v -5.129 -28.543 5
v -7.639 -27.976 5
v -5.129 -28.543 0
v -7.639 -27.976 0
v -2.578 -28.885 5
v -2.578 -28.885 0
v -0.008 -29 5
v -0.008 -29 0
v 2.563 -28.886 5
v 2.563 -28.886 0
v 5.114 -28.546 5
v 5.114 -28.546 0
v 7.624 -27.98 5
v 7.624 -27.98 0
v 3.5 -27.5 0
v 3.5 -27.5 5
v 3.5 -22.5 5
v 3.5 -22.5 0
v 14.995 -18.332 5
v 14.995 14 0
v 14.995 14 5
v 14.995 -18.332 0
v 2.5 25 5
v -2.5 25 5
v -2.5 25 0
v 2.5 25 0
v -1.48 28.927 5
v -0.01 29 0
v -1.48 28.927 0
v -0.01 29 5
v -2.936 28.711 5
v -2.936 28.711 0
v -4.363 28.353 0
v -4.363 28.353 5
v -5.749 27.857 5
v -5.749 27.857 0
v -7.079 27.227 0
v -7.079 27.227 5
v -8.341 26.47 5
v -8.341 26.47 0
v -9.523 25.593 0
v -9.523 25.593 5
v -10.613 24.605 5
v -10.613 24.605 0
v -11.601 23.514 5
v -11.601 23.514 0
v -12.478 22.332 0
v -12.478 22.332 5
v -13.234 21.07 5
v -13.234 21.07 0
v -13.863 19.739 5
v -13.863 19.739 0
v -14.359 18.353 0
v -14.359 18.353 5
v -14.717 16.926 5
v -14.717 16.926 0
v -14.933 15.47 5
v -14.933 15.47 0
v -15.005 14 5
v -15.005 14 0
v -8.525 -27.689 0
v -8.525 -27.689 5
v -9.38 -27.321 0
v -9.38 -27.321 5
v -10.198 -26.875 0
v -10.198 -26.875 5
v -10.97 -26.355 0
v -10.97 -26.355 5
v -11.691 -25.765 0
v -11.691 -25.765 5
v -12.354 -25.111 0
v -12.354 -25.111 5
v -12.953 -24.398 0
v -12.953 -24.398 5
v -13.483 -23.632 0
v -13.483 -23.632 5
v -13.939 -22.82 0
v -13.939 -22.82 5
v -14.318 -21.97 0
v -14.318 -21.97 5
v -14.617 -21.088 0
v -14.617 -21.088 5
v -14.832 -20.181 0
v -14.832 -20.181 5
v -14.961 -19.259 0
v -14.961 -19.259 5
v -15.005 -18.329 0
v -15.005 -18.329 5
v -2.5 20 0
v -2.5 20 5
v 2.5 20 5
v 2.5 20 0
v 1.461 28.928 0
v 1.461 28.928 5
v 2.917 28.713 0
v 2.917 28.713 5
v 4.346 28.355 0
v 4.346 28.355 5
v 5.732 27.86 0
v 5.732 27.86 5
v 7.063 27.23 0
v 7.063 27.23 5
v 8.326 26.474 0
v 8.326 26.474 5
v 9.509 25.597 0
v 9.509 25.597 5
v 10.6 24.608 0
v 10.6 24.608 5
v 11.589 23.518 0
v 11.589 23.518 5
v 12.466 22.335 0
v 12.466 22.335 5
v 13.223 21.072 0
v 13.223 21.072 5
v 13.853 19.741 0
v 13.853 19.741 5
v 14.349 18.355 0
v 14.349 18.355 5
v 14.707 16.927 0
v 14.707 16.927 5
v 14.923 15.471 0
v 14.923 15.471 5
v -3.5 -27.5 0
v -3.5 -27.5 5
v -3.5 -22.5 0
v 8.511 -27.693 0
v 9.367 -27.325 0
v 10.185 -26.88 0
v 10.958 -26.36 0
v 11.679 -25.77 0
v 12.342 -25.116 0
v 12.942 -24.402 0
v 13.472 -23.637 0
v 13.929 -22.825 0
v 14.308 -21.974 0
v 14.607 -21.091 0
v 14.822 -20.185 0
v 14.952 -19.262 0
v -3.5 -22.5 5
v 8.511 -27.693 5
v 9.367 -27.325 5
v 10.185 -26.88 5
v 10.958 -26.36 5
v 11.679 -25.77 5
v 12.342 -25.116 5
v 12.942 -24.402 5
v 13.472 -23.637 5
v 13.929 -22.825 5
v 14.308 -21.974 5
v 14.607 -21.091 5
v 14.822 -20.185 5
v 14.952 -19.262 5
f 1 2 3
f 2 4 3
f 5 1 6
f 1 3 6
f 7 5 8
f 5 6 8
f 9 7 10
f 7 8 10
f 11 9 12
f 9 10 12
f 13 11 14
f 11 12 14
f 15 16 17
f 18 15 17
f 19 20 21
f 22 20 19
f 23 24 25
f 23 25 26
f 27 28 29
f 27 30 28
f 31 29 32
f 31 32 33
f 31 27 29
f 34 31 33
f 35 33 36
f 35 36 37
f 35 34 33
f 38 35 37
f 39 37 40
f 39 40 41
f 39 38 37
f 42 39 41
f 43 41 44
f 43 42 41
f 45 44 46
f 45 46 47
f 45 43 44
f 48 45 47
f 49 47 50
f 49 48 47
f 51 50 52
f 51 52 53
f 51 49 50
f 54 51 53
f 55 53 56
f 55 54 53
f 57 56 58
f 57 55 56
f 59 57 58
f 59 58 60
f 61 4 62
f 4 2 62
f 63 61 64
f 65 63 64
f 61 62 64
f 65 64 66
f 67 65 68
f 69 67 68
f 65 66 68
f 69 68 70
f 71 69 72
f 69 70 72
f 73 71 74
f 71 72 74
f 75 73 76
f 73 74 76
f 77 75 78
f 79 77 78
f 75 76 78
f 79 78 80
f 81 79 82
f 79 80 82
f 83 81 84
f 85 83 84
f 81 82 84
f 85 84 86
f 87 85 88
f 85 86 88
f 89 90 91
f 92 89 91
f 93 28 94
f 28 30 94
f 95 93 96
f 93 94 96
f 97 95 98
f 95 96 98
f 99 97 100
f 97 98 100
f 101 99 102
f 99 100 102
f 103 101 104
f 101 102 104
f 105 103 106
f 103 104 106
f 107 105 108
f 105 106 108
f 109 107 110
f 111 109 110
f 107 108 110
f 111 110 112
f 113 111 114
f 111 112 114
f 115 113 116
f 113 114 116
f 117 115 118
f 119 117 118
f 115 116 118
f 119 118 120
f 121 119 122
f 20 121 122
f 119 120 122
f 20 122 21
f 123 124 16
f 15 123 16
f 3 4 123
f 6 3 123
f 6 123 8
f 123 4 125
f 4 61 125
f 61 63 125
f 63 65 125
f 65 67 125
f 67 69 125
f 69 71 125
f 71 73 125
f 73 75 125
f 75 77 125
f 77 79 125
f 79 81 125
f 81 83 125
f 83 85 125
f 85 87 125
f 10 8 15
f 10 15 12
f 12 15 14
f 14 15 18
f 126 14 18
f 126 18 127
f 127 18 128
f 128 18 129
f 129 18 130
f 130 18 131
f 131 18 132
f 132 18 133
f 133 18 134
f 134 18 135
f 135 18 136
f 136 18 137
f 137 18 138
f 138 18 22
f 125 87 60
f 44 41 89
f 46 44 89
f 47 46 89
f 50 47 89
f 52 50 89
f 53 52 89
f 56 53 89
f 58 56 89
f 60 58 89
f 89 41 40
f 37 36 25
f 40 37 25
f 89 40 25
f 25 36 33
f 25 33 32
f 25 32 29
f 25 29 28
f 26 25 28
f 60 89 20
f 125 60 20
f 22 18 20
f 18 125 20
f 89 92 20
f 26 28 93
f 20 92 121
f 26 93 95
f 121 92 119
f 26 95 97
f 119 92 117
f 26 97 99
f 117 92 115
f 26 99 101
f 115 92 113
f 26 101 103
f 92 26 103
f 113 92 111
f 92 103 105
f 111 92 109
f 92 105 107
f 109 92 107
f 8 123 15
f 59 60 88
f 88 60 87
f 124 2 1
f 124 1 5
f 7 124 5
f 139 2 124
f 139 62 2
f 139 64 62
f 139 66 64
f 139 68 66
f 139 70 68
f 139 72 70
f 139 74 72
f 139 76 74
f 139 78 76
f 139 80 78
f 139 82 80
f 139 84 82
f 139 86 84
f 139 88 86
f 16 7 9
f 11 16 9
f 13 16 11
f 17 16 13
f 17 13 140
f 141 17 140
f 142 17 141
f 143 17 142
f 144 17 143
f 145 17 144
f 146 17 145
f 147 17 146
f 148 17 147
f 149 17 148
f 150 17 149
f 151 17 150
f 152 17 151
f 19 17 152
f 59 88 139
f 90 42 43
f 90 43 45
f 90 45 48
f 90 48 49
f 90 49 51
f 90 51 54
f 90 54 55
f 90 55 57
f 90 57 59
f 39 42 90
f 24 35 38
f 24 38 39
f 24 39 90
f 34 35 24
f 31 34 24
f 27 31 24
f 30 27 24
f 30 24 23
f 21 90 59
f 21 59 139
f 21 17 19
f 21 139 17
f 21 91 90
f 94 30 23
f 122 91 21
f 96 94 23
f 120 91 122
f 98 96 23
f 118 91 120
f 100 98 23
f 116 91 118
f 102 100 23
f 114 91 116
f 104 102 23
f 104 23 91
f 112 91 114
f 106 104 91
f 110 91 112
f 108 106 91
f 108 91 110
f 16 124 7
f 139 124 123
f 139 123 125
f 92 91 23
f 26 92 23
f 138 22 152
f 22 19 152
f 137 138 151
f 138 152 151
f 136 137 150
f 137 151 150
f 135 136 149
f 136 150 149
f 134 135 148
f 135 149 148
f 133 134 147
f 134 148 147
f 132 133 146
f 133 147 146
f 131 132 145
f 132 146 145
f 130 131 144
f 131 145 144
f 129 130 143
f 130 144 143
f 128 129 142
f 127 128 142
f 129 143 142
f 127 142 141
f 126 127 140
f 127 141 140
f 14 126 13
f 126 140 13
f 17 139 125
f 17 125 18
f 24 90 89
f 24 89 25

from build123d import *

# Parameters (mm, degrees)
SKETCH1_R           = 29
BOSS_EXTRUDE1_DEPTH = 5
CUT_EXTRUDE3_START  = -10
CUT_EXTRUDE3_DEPTH  = 10
FILLET2_R           = 15
FILLET3_R           = 10
SKETCH7_W           = 5
SKETCH7_H           = 5
SKETCH7_W_2         = 7
CUT_EXTRUDE4_DEPTH  = 10


with BuildPart() as part:
    # Sketch1 → Boss-Extrude1 (new body)
    with BuildSketch(Plane.XY):
        Circle(SKETCH1_R)
    extrude(amount=BOSS_EXTRUDE1_DEPTH)

    # Sketch6 → Cut-Extrude3 (cut)
    with BuildSketch(Plane.XY.offset(5).offset(CUT_EXTRUDE3_START)):
        with BuildLine():
            Line((-15.004747761, 24.816477281), (-15.004747761, -24.816477281))
            ThreePointArc((-15.004747761, -24.816477281), (-29, 0), (-15.004747761, 24.816477281))
        make_face()
        with BuildLine():
            Line((14.995252239, 24.822216063), (14.995252239, -24.822216063))
            ThreePointArc((14.995252239, -24.822216063), (29, 0), (14.995252239, 24.822216063))
        make_face()
    extrude(amount=CUT_EXTRUDE3_DEPTH, mode=Mode.SUBTRACT)

    # Fillet2
    fillet2_edges = [part.edges().sort_by_distance(p)[0] for p in [
        (-15.004747761, 24.816477281, 2.5),
        (14.995252239, 24.822216063, 2.5),
    ]]
    fillet(fillet2_edges, radius=FILLET2_R - 0.0001)  # a hair under: the kernel refuses the full size

    # Fillet3
    fillet3_edges = [part.edges().sort_by_distance(p)[0] for p in [
        (-15.004747761, -24.816477281, 2.5),
        (14.995252239, -24.822216063, 2.5),
    ]]
    fillet(fillet3_edges, radius=FILLET3_R)

    # Sketch7 → Cut-Extrude4 (cut)
    with BuildSketch(Plane.XY.offset(5)):
        with Locations((0, 22.499998332)):
            Rectangle(SKETCH7_W, SKETCH7_H)
        with Locations((0, -25.000001668)):
            Rectangle(SKETCH7_W_2, SKETCH7_H)
    extrude(amount=-CUT_EXTRUDE4_DEPTH, mode=Mode.SUBTRACT)


solid = part.part
